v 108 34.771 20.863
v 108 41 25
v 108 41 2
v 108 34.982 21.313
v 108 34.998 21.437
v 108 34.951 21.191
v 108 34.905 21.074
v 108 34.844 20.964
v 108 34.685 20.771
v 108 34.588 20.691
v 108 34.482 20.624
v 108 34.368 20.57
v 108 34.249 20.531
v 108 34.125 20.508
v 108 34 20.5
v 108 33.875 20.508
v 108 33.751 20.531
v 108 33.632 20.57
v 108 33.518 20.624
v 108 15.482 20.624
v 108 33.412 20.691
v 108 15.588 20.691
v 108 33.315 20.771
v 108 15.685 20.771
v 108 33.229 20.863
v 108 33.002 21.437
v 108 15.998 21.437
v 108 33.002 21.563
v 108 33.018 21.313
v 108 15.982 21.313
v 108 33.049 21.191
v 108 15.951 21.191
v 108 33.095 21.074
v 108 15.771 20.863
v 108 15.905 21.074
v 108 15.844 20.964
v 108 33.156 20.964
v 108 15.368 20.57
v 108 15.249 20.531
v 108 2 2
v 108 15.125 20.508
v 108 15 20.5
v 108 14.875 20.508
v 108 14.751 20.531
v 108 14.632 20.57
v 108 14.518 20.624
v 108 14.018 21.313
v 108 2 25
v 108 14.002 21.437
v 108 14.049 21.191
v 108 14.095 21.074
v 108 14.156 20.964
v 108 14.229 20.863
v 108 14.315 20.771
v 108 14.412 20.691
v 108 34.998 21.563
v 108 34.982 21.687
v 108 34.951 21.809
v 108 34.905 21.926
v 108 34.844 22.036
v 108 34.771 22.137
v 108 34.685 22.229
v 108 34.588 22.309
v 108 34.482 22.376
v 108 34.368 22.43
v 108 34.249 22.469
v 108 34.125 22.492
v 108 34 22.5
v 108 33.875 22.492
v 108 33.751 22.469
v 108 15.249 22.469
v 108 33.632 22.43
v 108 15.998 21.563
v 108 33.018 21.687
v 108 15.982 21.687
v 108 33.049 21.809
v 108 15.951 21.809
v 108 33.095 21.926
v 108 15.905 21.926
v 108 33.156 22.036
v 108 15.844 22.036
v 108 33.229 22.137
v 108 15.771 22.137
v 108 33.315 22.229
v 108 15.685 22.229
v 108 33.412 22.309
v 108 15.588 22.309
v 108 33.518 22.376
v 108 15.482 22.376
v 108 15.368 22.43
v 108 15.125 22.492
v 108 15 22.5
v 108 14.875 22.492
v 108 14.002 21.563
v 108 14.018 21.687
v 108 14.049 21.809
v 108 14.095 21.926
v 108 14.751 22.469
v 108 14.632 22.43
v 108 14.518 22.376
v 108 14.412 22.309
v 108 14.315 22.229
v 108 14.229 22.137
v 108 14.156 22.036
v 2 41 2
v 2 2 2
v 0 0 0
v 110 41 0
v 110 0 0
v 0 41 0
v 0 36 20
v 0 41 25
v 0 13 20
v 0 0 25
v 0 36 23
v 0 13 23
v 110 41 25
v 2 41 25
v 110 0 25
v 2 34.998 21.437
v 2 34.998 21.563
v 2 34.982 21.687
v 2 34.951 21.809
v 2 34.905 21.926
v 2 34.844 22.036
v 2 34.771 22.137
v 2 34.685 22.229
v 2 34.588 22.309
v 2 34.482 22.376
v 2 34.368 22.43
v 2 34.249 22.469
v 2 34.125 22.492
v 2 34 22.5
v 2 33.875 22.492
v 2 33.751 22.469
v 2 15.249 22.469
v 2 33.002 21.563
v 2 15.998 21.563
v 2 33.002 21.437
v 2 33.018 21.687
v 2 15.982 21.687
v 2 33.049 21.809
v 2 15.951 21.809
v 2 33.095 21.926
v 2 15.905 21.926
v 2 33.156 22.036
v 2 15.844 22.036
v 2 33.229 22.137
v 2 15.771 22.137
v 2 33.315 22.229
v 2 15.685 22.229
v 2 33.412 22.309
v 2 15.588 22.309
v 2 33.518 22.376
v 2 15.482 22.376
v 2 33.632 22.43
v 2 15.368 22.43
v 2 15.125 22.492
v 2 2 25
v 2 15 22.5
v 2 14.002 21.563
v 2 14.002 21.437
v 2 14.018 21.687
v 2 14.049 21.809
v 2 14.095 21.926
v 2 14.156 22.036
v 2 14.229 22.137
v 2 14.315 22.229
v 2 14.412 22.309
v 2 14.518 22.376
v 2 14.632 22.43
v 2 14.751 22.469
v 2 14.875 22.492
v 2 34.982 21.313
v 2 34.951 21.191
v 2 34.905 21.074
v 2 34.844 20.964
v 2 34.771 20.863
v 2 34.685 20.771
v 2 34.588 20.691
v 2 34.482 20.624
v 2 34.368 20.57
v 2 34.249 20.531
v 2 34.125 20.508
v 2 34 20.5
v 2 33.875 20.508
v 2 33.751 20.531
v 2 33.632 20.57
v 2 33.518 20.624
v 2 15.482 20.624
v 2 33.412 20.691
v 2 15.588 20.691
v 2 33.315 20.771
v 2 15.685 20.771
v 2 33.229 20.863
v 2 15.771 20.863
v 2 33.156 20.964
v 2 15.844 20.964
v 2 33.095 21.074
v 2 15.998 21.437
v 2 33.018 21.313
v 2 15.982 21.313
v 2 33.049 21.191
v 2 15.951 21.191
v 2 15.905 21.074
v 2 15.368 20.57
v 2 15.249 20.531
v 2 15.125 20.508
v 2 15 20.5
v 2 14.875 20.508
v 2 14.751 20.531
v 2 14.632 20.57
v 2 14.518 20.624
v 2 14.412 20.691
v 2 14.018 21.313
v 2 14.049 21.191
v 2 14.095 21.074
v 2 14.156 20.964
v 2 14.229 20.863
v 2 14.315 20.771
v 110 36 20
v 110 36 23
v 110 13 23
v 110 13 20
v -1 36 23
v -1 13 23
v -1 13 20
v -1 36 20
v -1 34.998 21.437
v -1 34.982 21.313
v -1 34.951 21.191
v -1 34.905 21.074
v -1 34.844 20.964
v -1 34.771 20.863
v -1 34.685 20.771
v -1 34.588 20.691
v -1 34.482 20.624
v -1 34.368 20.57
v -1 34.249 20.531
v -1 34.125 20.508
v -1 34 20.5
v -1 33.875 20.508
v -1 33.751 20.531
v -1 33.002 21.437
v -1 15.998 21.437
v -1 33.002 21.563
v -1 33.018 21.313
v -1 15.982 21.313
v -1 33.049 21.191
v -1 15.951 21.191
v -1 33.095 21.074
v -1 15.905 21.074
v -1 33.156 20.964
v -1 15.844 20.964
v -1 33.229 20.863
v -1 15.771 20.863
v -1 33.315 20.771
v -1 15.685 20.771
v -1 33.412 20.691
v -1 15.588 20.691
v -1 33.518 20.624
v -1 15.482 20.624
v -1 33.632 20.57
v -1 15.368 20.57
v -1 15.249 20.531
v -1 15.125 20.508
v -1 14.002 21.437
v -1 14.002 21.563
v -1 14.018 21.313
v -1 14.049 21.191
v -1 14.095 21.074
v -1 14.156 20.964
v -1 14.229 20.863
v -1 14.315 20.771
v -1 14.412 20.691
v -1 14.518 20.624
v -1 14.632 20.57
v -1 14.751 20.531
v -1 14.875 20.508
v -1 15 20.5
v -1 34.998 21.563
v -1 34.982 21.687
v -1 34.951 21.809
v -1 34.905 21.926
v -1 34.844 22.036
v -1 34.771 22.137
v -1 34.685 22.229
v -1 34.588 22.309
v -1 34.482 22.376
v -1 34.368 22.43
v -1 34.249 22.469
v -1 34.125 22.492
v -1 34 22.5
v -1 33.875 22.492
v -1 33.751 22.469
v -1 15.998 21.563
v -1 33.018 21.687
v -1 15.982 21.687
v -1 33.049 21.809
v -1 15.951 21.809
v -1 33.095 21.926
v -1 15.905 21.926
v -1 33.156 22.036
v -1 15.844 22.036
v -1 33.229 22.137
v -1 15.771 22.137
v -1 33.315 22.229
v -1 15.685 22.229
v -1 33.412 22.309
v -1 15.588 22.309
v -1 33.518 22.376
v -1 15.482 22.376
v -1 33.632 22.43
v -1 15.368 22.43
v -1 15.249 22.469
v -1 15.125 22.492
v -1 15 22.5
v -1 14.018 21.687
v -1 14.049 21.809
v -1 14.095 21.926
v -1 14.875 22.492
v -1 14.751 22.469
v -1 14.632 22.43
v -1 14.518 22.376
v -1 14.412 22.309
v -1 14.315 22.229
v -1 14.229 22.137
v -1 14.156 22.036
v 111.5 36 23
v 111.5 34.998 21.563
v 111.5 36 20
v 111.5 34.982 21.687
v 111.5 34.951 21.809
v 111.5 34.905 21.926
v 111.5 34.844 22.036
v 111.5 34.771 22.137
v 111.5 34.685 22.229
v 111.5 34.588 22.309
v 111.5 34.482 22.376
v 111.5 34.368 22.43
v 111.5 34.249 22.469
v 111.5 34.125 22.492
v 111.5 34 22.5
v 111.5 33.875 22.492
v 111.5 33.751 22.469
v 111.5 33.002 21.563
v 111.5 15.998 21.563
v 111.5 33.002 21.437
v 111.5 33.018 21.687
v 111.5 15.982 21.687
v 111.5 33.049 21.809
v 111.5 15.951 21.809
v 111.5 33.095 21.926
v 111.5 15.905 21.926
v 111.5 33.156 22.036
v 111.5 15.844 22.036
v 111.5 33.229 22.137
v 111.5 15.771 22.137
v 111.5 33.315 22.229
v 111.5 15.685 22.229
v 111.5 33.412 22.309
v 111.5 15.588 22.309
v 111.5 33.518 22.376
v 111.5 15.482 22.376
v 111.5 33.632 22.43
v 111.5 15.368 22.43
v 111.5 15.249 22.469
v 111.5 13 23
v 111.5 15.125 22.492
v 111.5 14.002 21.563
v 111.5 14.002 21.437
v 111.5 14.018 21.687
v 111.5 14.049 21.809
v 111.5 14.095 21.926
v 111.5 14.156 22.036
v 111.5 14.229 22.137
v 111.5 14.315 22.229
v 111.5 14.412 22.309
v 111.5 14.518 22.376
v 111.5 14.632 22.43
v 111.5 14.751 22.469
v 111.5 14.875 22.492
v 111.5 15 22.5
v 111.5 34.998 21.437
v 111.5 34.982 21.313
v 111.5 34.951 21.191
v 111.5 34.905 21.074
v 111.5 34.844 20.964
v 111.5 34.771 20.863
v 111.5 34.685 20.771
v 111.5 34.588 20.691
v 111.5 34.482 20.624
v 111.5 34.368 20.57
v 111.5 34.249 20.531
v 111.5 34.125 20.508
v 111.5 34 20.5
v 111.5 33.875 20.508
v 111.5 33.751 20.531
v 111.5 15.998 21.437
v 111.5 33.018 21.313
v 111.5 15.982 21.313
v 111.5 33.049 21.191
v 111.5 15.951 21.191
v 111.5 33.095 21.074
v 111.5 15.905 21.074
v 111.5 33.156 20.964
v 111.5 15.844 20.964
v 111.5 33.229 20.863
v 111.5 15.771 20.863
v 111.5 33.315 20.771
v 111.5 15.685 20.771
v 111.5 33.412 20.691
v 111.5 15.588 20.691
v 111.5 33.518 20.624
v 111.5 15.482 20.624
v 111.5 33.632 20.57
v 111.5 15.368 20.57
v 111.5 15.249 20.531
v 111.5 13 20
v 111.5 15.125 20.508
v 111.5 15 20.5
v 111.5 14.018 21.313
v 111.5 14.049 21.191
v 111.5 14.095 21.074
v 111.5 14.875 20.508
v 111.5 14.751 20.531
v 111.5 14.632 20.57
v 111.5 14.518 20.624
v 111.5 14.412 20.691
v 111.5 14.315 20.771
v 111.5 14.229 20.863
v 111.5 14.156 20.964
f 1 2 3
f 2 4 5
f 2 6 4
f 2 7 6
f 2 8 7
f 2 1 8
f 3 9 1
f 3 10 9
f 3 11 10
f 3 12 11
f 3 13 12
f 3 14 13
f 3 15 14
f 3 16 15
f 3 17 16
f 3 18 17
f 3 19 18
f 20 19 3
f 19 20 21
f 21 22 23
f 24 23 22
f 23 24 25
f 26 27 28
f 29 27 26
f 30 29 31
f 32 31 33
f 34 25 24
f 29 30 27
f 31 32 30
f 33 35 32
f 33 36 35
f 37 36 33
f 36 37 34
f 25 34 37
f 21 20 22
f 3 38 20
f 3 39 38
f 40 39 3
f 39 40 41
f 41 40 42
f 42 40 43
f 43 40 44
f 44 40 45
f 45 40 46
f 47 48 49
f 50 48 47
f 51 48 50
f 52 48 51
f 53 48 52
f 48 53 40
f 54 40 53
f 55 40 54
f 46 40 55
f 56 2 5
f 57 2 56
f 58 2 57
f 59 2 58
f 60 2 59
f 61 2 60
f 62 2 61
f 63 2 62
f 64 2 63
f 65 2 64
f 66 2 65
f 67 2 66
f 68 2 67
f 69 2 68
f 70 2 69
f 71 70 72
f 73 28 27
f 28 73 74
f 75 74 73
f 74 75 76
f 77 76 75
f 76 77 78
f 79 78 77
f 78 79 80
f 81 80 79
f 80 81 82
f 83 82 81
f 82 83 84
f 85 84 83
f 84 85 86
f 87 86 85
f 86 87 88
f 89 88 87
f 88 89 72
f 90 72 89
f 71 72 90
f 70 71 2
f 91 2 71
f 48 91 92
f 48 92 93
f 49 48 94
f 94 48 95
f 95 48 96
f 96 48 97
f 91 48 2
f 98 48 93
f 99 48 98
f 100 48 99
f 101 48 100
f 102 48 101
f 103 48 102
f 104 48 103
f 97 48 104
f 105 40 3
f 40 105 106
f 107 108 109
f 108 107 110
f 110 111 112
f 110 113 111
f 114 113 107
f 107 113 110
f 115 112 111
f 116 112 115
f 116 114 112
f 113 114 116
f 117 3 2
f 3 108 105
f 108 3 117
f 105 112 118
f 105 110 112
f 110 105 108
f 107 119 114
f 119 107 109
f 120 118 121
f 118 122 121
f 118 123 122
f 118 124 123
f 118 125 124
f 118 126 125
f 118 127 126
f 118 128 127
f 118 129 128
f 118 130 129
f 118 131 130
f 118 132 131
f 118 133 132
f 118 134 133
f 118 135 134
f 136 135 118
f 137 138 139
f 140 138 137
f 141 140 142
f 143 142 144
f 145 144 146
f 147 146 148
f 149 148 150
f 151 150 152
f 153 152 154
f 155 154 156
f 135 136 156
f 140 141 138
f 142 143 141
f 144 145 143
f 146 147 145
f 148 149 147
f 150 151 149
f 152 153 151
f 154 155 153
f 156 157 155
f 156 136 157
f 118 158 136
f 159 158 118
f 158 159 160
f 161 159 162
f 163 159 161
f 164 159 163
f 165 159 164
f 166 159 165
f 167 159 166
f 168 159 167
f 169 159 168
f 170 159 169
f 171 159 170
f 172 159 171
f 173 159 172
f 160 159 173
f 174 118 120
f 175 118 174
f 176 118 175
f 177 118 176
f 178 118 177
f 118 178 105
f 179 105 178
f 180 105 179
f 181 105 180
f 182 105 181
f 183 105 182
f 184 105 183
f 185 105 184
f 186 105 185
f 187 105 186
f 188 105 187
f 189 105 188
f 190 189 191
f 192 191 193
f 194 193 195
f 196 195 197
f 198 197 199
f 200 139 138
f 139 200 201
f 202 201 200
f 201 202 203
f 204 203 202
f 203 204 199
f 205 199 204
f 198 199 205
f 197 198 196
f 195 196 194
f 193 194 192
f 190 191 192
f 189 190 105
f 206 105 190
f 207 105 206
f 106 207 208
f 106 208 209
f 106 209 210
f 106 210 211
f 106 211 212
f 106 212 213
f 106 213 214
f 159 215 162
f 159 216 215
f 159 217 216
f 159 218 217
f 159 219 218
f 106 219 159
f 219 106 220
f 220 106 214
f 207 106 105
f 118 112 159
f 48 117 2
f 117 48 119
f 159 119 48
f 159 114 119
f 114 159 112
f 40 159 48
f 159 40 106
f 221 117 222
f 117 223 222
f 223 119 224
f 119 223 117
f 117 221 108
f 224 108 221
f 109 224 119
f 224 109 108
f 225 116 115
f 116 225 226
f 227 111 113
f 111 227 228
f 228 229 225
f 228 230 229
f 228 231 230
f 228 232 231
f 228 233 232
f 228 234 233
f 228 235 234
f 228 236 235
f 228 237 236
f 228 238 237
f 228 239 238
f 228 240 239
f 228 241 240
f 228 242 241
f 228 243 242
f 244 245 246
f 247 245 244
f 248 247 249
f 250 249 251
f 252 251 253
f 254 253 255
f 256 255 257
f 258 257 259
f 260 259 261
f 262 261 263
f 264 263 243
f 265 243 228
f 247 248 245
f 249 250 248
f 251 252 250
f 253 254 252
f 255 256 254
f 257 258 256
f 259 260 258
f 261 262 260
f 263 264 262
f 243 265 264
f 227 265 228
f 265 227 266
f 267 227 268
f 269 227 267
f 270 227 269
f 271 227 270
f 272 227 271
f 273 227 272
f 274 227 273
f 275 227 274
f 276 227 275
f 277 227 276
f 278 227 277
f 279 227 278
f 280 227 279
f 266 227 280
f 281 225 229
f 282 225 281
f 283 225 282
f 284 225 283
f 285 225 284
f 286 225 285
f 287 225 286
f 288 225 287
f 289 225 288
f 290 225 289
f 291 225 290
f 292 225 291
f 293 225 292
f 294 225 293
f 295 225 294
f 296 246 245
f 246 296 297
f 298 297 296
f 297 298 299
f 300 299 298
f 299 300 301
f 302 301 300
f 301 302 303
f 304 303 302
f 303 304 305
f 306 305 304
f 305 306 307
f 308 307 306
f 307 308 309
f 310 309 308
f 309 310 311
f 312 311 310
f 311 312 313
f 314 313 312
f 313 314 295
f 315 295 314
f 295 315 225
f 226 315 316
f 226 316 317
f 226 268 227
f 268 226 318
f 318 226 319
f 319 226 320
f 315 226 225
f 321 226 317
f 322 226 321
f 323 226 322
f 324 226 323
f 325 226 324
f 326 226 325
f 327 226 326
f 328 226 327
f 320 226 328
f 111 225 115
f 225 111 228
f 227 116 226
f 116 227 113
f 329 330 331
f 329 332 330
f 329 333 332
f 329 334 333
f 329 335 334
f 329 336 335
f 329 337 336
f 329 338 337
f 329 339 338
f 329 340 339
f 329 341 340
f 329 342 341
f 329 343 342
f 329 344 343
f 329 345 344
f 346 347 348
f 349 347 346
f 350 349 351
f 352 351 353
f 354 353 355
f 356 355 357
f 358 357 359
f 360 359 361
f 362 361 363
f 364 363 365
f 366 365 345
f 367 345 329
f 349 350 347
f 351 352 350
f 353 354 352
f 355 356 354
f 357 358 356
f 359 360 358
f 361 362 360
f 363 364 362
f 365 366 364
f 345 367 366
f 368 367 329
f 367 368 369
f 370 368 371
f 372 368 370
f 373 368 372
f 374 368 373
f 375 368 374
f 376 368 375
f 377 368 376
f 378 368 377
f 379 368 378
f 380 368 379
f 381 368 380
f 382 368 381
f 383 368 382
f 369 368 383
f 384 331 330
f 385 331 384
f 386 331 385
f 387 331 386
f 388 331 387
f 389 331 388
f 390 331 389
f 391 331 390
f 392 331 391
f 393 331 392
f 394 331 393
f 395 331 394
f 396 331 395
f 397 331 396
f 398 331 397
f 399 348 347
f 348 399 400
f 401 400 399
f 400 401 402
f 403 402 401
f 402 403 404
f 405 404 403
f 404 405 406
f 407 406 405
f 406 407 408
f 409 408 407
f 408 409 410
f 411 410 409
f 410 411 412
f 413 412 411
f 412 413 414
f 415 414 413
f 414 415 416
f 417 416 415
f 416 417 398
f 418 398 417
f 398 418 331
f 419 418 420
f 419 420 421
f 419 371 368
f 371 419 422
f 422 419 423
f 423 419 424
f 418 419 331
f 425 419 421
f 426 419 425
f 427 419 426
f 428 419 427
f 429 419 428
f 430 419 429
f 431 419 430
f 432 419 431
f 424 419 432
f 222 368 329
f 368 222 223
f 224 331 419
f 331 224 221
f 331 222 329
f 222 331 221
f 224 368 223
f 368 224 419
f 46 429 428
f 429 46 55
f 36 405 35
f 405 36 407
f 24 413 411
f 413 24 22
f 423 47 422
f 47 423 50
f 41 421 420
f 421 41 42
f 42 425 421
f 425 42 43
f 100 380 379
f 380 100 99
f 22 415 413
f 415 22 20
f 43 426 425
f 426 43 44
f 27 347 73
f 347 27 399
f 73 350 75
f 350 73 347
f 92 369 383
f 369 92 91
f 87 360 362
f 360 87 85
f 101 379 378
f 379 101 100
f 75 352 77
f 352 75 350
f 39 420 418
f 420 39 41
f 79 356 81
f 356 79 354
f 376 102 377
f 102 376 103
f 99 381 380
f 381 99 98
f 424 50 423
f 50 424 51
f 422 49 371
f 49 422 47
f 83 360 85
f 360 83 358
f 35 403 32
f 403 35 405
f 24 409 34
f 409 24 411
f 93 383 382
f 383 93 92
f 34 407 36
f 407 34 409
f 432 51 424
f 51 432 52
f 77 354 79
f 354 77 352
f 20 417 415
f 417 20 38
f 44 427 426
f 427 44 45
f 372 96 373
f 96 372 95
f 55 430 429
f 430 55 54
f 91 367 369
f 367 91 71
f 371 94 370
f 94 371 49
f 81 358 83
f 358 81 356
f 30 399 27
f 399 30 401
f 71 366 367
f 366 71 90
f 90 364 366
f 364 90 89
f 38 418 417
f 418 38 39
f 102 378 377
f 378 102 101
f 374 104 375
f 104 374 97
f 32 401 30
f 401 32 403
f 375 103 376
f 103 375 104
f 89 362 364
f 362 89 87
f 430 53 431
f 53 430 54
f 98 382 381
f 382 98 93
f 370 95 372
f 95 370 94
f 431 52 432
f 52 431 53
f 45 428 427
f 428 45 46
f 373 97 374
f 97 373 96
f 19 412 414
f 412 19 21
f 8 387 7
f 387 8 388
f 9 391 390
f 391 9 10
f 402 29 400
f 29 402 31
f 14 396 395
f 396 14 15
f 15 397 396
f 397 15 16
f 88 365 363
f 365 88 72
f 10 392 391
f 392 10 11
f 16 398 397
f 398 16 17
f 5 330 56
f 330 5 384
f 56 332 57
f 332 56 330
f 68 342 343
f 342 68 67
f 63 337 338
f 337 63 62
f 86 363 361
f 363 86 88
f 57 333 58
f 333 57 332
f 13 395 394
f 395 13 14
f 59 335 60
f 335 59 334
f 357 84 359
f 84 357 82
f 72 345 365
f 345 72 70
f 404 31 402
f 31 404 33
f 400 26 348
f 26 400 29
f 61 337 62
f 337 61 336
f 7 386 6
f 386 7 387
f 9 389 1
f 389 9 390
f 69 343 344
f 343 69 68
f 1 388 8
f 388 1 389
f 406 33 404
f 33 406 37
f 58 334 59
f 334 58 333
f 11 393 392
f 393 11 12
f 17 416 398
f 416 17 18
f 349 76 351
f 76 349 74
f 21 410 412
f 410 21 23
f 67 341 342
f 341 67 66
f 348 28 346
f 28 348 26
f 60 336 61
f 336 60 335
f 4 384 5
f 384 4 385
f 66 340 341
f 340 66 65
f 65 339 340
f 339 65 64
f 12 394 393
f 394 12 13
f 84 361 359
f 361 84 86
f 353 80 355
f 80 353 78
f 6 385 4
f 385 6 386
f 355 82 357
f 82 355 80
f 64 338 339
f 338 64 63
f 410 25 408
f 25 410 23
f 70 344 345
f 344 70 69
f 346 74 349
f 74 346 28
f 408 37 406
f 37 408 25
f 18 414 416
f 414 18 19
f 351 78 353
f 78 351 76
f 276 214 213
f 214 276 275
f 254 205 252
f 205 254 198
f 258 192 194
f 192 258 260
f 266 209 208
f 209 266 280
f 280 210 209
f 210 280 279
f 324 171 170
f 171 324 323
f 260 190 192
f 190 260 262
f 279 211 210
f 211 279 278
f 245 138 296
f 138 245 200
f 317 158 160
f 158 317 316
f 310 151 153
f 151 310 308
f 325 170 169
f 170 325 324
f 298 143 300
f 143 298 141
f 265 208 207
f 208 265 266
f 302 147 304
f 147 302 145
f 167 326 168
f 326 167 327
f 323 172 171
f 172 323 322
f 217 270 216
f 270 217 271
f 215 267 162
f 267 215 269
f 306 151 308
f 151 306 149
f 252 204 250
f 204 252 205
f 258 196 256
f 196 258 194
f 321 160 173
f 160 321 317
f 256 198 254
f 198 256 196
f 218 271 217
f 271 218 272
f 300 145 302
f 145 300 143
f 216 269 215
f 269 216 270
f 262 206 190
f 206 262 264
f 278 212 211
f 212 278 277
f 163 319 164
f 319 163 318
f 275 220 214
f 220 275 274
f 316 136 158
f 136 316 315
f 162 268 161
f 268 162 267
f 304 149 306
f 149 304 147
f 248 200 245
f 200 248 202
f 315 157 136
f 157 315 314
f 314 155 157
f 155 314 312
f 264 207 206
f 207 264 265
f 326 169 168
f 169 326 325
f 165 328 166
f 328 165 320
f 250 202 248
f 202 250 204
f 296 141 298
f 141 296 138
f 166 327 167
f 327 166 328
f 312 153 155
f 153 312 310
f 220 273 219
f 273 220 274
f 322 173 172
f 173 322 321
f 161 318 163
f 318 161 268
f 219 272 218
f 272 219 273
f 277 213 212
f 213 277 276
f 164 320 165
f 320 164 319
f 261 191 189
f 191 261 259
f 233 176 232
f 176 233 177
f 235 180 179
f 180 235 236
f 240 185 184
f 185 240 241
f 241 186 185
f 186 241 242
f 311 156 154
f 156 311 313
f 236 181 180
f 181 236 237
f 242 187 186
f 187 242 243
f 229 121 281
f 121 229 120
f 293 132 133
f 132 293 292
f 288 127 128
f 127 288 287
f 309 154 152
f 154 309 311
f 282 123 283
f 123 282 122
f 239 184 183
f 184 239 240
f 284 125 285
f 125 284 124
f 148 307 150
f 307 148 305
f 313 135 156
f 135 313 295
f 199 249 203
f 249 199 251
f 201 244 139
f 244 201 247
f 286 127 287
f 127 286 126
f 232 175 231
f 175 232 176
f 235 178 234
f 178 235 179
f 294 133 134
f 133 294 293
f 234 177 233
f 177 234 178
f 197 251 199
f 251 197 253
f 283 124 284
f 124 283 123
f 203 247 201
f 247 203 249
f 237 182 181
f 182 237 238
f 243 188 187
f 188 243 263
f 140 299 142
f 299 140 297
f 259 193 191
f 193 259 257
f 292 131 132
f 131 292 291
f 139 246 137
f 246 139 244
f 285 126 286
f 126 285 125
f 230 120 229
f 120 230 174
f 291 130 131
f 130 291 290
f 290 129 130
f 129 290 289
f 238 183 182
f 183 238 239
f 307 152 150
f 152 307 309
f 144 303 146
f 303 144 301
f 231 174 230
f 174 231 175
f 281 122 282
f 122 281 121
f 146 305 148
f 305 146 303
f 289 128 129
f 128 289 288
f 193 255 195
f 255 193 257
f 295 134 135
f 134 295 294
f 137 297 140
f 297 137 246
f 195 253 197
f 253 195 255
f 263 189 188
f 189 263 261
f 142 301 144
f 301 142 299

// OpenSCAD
/*************************************************************************************************
Power Supply Terminal Cover for the power supply commonly used with the Bukobot and other 3d printers
Author: Mike Thompson (thingiverse: mike_linus)
Date Last Modified: 11/03/2013 4:19pm
Description: simply change the cutout parameters to suit. Note: do not change length, height, depth and thickness parameters for the base unless you want to change the core dimensions.
**************************************************************************************************/

//***************************************************************
//don't change these base parameters unless you want to change the core dimensions.
//***************************************************************
hole_resolution=50;
base_length=108;
base_height=41;
base_depth=25;
base_thickness=2;
$fn=hole_resolution;

//***************************************************************
//change these cutout parameters to suit you own switch size etc.
//***************************************************************
switch_cutout_length=27;
switch_cutout_width=12;

led_cutout_radius=4;
grommet_cutout_radius=6;

power_plug_cutout_length=28;
power_plug_cutout_width=20;

screw_hole_cutout_radius=1;

module base(){
cube([base_length,base_height,base_thickness]);
cube([base_thickness,base_height,base_depth]);
cube([base_length,base_thickness,base_depth]);
translate([base_length,0,0])cube([base_thickness,base_height,base_depth]);
translate([-1,13,base_depth-5])cube([1.5,23,3]);//slot retainer //dec
translate([base_length+base_thickness,13,base_depth-5])cube([1.5,23,3]);//slot retainer  //dec
}

difference(){
base();
//translate([72,0,3])cube([switch_cutout_length,base_thickness,switch_cutout_width]);  //switch cutout //dec
//translate([8,3,9])rotate([90,0,0])cylinder(r=led_cutout_radius,h=5);  //led cutout//dec
//translate([60,20,0])cylinder(r=grommet_cutout_radius,h=5);  //12v lead cutout//dec
//translate([14,3,0])cube([power_plug_cutout_length,power_plug_cutout_width,base_thickness]);  //240v plug cutout//dec
//translate([7.5,12.75,0])cylinder(r=screw_hole_cutout_radius,h=5);  //240v plug screw hole//dec
//translate([48,12.75,0])cylinder(r=screw_hole_cutout_radius,h=5);  //240v plug screw hole//dec
translate([base_length,15,base_depth-3.5])rotate([0,90,0])cylinder(r=screw_hole_cutout_radius,h=5);  //retainer screw hole //dec
translate([base_length,34,base_depth-3.5])rotate([0,90,0])cylinder(r=screw_hole_cutout_radius,h=5);  //retainer screw hole //dec
translate([-1,15,base_depth-3.5])rotate([0,90,0])cylinder(r=screw_hole_cutout_radius,h=5);  //retainer screw hole //dec
translate([-1,34,base_depth-3.5])rotate([0,90,0])cylinder(r=screw_hole_cutout_radius,h=5);  //retainer screw hole//d\ec
}
